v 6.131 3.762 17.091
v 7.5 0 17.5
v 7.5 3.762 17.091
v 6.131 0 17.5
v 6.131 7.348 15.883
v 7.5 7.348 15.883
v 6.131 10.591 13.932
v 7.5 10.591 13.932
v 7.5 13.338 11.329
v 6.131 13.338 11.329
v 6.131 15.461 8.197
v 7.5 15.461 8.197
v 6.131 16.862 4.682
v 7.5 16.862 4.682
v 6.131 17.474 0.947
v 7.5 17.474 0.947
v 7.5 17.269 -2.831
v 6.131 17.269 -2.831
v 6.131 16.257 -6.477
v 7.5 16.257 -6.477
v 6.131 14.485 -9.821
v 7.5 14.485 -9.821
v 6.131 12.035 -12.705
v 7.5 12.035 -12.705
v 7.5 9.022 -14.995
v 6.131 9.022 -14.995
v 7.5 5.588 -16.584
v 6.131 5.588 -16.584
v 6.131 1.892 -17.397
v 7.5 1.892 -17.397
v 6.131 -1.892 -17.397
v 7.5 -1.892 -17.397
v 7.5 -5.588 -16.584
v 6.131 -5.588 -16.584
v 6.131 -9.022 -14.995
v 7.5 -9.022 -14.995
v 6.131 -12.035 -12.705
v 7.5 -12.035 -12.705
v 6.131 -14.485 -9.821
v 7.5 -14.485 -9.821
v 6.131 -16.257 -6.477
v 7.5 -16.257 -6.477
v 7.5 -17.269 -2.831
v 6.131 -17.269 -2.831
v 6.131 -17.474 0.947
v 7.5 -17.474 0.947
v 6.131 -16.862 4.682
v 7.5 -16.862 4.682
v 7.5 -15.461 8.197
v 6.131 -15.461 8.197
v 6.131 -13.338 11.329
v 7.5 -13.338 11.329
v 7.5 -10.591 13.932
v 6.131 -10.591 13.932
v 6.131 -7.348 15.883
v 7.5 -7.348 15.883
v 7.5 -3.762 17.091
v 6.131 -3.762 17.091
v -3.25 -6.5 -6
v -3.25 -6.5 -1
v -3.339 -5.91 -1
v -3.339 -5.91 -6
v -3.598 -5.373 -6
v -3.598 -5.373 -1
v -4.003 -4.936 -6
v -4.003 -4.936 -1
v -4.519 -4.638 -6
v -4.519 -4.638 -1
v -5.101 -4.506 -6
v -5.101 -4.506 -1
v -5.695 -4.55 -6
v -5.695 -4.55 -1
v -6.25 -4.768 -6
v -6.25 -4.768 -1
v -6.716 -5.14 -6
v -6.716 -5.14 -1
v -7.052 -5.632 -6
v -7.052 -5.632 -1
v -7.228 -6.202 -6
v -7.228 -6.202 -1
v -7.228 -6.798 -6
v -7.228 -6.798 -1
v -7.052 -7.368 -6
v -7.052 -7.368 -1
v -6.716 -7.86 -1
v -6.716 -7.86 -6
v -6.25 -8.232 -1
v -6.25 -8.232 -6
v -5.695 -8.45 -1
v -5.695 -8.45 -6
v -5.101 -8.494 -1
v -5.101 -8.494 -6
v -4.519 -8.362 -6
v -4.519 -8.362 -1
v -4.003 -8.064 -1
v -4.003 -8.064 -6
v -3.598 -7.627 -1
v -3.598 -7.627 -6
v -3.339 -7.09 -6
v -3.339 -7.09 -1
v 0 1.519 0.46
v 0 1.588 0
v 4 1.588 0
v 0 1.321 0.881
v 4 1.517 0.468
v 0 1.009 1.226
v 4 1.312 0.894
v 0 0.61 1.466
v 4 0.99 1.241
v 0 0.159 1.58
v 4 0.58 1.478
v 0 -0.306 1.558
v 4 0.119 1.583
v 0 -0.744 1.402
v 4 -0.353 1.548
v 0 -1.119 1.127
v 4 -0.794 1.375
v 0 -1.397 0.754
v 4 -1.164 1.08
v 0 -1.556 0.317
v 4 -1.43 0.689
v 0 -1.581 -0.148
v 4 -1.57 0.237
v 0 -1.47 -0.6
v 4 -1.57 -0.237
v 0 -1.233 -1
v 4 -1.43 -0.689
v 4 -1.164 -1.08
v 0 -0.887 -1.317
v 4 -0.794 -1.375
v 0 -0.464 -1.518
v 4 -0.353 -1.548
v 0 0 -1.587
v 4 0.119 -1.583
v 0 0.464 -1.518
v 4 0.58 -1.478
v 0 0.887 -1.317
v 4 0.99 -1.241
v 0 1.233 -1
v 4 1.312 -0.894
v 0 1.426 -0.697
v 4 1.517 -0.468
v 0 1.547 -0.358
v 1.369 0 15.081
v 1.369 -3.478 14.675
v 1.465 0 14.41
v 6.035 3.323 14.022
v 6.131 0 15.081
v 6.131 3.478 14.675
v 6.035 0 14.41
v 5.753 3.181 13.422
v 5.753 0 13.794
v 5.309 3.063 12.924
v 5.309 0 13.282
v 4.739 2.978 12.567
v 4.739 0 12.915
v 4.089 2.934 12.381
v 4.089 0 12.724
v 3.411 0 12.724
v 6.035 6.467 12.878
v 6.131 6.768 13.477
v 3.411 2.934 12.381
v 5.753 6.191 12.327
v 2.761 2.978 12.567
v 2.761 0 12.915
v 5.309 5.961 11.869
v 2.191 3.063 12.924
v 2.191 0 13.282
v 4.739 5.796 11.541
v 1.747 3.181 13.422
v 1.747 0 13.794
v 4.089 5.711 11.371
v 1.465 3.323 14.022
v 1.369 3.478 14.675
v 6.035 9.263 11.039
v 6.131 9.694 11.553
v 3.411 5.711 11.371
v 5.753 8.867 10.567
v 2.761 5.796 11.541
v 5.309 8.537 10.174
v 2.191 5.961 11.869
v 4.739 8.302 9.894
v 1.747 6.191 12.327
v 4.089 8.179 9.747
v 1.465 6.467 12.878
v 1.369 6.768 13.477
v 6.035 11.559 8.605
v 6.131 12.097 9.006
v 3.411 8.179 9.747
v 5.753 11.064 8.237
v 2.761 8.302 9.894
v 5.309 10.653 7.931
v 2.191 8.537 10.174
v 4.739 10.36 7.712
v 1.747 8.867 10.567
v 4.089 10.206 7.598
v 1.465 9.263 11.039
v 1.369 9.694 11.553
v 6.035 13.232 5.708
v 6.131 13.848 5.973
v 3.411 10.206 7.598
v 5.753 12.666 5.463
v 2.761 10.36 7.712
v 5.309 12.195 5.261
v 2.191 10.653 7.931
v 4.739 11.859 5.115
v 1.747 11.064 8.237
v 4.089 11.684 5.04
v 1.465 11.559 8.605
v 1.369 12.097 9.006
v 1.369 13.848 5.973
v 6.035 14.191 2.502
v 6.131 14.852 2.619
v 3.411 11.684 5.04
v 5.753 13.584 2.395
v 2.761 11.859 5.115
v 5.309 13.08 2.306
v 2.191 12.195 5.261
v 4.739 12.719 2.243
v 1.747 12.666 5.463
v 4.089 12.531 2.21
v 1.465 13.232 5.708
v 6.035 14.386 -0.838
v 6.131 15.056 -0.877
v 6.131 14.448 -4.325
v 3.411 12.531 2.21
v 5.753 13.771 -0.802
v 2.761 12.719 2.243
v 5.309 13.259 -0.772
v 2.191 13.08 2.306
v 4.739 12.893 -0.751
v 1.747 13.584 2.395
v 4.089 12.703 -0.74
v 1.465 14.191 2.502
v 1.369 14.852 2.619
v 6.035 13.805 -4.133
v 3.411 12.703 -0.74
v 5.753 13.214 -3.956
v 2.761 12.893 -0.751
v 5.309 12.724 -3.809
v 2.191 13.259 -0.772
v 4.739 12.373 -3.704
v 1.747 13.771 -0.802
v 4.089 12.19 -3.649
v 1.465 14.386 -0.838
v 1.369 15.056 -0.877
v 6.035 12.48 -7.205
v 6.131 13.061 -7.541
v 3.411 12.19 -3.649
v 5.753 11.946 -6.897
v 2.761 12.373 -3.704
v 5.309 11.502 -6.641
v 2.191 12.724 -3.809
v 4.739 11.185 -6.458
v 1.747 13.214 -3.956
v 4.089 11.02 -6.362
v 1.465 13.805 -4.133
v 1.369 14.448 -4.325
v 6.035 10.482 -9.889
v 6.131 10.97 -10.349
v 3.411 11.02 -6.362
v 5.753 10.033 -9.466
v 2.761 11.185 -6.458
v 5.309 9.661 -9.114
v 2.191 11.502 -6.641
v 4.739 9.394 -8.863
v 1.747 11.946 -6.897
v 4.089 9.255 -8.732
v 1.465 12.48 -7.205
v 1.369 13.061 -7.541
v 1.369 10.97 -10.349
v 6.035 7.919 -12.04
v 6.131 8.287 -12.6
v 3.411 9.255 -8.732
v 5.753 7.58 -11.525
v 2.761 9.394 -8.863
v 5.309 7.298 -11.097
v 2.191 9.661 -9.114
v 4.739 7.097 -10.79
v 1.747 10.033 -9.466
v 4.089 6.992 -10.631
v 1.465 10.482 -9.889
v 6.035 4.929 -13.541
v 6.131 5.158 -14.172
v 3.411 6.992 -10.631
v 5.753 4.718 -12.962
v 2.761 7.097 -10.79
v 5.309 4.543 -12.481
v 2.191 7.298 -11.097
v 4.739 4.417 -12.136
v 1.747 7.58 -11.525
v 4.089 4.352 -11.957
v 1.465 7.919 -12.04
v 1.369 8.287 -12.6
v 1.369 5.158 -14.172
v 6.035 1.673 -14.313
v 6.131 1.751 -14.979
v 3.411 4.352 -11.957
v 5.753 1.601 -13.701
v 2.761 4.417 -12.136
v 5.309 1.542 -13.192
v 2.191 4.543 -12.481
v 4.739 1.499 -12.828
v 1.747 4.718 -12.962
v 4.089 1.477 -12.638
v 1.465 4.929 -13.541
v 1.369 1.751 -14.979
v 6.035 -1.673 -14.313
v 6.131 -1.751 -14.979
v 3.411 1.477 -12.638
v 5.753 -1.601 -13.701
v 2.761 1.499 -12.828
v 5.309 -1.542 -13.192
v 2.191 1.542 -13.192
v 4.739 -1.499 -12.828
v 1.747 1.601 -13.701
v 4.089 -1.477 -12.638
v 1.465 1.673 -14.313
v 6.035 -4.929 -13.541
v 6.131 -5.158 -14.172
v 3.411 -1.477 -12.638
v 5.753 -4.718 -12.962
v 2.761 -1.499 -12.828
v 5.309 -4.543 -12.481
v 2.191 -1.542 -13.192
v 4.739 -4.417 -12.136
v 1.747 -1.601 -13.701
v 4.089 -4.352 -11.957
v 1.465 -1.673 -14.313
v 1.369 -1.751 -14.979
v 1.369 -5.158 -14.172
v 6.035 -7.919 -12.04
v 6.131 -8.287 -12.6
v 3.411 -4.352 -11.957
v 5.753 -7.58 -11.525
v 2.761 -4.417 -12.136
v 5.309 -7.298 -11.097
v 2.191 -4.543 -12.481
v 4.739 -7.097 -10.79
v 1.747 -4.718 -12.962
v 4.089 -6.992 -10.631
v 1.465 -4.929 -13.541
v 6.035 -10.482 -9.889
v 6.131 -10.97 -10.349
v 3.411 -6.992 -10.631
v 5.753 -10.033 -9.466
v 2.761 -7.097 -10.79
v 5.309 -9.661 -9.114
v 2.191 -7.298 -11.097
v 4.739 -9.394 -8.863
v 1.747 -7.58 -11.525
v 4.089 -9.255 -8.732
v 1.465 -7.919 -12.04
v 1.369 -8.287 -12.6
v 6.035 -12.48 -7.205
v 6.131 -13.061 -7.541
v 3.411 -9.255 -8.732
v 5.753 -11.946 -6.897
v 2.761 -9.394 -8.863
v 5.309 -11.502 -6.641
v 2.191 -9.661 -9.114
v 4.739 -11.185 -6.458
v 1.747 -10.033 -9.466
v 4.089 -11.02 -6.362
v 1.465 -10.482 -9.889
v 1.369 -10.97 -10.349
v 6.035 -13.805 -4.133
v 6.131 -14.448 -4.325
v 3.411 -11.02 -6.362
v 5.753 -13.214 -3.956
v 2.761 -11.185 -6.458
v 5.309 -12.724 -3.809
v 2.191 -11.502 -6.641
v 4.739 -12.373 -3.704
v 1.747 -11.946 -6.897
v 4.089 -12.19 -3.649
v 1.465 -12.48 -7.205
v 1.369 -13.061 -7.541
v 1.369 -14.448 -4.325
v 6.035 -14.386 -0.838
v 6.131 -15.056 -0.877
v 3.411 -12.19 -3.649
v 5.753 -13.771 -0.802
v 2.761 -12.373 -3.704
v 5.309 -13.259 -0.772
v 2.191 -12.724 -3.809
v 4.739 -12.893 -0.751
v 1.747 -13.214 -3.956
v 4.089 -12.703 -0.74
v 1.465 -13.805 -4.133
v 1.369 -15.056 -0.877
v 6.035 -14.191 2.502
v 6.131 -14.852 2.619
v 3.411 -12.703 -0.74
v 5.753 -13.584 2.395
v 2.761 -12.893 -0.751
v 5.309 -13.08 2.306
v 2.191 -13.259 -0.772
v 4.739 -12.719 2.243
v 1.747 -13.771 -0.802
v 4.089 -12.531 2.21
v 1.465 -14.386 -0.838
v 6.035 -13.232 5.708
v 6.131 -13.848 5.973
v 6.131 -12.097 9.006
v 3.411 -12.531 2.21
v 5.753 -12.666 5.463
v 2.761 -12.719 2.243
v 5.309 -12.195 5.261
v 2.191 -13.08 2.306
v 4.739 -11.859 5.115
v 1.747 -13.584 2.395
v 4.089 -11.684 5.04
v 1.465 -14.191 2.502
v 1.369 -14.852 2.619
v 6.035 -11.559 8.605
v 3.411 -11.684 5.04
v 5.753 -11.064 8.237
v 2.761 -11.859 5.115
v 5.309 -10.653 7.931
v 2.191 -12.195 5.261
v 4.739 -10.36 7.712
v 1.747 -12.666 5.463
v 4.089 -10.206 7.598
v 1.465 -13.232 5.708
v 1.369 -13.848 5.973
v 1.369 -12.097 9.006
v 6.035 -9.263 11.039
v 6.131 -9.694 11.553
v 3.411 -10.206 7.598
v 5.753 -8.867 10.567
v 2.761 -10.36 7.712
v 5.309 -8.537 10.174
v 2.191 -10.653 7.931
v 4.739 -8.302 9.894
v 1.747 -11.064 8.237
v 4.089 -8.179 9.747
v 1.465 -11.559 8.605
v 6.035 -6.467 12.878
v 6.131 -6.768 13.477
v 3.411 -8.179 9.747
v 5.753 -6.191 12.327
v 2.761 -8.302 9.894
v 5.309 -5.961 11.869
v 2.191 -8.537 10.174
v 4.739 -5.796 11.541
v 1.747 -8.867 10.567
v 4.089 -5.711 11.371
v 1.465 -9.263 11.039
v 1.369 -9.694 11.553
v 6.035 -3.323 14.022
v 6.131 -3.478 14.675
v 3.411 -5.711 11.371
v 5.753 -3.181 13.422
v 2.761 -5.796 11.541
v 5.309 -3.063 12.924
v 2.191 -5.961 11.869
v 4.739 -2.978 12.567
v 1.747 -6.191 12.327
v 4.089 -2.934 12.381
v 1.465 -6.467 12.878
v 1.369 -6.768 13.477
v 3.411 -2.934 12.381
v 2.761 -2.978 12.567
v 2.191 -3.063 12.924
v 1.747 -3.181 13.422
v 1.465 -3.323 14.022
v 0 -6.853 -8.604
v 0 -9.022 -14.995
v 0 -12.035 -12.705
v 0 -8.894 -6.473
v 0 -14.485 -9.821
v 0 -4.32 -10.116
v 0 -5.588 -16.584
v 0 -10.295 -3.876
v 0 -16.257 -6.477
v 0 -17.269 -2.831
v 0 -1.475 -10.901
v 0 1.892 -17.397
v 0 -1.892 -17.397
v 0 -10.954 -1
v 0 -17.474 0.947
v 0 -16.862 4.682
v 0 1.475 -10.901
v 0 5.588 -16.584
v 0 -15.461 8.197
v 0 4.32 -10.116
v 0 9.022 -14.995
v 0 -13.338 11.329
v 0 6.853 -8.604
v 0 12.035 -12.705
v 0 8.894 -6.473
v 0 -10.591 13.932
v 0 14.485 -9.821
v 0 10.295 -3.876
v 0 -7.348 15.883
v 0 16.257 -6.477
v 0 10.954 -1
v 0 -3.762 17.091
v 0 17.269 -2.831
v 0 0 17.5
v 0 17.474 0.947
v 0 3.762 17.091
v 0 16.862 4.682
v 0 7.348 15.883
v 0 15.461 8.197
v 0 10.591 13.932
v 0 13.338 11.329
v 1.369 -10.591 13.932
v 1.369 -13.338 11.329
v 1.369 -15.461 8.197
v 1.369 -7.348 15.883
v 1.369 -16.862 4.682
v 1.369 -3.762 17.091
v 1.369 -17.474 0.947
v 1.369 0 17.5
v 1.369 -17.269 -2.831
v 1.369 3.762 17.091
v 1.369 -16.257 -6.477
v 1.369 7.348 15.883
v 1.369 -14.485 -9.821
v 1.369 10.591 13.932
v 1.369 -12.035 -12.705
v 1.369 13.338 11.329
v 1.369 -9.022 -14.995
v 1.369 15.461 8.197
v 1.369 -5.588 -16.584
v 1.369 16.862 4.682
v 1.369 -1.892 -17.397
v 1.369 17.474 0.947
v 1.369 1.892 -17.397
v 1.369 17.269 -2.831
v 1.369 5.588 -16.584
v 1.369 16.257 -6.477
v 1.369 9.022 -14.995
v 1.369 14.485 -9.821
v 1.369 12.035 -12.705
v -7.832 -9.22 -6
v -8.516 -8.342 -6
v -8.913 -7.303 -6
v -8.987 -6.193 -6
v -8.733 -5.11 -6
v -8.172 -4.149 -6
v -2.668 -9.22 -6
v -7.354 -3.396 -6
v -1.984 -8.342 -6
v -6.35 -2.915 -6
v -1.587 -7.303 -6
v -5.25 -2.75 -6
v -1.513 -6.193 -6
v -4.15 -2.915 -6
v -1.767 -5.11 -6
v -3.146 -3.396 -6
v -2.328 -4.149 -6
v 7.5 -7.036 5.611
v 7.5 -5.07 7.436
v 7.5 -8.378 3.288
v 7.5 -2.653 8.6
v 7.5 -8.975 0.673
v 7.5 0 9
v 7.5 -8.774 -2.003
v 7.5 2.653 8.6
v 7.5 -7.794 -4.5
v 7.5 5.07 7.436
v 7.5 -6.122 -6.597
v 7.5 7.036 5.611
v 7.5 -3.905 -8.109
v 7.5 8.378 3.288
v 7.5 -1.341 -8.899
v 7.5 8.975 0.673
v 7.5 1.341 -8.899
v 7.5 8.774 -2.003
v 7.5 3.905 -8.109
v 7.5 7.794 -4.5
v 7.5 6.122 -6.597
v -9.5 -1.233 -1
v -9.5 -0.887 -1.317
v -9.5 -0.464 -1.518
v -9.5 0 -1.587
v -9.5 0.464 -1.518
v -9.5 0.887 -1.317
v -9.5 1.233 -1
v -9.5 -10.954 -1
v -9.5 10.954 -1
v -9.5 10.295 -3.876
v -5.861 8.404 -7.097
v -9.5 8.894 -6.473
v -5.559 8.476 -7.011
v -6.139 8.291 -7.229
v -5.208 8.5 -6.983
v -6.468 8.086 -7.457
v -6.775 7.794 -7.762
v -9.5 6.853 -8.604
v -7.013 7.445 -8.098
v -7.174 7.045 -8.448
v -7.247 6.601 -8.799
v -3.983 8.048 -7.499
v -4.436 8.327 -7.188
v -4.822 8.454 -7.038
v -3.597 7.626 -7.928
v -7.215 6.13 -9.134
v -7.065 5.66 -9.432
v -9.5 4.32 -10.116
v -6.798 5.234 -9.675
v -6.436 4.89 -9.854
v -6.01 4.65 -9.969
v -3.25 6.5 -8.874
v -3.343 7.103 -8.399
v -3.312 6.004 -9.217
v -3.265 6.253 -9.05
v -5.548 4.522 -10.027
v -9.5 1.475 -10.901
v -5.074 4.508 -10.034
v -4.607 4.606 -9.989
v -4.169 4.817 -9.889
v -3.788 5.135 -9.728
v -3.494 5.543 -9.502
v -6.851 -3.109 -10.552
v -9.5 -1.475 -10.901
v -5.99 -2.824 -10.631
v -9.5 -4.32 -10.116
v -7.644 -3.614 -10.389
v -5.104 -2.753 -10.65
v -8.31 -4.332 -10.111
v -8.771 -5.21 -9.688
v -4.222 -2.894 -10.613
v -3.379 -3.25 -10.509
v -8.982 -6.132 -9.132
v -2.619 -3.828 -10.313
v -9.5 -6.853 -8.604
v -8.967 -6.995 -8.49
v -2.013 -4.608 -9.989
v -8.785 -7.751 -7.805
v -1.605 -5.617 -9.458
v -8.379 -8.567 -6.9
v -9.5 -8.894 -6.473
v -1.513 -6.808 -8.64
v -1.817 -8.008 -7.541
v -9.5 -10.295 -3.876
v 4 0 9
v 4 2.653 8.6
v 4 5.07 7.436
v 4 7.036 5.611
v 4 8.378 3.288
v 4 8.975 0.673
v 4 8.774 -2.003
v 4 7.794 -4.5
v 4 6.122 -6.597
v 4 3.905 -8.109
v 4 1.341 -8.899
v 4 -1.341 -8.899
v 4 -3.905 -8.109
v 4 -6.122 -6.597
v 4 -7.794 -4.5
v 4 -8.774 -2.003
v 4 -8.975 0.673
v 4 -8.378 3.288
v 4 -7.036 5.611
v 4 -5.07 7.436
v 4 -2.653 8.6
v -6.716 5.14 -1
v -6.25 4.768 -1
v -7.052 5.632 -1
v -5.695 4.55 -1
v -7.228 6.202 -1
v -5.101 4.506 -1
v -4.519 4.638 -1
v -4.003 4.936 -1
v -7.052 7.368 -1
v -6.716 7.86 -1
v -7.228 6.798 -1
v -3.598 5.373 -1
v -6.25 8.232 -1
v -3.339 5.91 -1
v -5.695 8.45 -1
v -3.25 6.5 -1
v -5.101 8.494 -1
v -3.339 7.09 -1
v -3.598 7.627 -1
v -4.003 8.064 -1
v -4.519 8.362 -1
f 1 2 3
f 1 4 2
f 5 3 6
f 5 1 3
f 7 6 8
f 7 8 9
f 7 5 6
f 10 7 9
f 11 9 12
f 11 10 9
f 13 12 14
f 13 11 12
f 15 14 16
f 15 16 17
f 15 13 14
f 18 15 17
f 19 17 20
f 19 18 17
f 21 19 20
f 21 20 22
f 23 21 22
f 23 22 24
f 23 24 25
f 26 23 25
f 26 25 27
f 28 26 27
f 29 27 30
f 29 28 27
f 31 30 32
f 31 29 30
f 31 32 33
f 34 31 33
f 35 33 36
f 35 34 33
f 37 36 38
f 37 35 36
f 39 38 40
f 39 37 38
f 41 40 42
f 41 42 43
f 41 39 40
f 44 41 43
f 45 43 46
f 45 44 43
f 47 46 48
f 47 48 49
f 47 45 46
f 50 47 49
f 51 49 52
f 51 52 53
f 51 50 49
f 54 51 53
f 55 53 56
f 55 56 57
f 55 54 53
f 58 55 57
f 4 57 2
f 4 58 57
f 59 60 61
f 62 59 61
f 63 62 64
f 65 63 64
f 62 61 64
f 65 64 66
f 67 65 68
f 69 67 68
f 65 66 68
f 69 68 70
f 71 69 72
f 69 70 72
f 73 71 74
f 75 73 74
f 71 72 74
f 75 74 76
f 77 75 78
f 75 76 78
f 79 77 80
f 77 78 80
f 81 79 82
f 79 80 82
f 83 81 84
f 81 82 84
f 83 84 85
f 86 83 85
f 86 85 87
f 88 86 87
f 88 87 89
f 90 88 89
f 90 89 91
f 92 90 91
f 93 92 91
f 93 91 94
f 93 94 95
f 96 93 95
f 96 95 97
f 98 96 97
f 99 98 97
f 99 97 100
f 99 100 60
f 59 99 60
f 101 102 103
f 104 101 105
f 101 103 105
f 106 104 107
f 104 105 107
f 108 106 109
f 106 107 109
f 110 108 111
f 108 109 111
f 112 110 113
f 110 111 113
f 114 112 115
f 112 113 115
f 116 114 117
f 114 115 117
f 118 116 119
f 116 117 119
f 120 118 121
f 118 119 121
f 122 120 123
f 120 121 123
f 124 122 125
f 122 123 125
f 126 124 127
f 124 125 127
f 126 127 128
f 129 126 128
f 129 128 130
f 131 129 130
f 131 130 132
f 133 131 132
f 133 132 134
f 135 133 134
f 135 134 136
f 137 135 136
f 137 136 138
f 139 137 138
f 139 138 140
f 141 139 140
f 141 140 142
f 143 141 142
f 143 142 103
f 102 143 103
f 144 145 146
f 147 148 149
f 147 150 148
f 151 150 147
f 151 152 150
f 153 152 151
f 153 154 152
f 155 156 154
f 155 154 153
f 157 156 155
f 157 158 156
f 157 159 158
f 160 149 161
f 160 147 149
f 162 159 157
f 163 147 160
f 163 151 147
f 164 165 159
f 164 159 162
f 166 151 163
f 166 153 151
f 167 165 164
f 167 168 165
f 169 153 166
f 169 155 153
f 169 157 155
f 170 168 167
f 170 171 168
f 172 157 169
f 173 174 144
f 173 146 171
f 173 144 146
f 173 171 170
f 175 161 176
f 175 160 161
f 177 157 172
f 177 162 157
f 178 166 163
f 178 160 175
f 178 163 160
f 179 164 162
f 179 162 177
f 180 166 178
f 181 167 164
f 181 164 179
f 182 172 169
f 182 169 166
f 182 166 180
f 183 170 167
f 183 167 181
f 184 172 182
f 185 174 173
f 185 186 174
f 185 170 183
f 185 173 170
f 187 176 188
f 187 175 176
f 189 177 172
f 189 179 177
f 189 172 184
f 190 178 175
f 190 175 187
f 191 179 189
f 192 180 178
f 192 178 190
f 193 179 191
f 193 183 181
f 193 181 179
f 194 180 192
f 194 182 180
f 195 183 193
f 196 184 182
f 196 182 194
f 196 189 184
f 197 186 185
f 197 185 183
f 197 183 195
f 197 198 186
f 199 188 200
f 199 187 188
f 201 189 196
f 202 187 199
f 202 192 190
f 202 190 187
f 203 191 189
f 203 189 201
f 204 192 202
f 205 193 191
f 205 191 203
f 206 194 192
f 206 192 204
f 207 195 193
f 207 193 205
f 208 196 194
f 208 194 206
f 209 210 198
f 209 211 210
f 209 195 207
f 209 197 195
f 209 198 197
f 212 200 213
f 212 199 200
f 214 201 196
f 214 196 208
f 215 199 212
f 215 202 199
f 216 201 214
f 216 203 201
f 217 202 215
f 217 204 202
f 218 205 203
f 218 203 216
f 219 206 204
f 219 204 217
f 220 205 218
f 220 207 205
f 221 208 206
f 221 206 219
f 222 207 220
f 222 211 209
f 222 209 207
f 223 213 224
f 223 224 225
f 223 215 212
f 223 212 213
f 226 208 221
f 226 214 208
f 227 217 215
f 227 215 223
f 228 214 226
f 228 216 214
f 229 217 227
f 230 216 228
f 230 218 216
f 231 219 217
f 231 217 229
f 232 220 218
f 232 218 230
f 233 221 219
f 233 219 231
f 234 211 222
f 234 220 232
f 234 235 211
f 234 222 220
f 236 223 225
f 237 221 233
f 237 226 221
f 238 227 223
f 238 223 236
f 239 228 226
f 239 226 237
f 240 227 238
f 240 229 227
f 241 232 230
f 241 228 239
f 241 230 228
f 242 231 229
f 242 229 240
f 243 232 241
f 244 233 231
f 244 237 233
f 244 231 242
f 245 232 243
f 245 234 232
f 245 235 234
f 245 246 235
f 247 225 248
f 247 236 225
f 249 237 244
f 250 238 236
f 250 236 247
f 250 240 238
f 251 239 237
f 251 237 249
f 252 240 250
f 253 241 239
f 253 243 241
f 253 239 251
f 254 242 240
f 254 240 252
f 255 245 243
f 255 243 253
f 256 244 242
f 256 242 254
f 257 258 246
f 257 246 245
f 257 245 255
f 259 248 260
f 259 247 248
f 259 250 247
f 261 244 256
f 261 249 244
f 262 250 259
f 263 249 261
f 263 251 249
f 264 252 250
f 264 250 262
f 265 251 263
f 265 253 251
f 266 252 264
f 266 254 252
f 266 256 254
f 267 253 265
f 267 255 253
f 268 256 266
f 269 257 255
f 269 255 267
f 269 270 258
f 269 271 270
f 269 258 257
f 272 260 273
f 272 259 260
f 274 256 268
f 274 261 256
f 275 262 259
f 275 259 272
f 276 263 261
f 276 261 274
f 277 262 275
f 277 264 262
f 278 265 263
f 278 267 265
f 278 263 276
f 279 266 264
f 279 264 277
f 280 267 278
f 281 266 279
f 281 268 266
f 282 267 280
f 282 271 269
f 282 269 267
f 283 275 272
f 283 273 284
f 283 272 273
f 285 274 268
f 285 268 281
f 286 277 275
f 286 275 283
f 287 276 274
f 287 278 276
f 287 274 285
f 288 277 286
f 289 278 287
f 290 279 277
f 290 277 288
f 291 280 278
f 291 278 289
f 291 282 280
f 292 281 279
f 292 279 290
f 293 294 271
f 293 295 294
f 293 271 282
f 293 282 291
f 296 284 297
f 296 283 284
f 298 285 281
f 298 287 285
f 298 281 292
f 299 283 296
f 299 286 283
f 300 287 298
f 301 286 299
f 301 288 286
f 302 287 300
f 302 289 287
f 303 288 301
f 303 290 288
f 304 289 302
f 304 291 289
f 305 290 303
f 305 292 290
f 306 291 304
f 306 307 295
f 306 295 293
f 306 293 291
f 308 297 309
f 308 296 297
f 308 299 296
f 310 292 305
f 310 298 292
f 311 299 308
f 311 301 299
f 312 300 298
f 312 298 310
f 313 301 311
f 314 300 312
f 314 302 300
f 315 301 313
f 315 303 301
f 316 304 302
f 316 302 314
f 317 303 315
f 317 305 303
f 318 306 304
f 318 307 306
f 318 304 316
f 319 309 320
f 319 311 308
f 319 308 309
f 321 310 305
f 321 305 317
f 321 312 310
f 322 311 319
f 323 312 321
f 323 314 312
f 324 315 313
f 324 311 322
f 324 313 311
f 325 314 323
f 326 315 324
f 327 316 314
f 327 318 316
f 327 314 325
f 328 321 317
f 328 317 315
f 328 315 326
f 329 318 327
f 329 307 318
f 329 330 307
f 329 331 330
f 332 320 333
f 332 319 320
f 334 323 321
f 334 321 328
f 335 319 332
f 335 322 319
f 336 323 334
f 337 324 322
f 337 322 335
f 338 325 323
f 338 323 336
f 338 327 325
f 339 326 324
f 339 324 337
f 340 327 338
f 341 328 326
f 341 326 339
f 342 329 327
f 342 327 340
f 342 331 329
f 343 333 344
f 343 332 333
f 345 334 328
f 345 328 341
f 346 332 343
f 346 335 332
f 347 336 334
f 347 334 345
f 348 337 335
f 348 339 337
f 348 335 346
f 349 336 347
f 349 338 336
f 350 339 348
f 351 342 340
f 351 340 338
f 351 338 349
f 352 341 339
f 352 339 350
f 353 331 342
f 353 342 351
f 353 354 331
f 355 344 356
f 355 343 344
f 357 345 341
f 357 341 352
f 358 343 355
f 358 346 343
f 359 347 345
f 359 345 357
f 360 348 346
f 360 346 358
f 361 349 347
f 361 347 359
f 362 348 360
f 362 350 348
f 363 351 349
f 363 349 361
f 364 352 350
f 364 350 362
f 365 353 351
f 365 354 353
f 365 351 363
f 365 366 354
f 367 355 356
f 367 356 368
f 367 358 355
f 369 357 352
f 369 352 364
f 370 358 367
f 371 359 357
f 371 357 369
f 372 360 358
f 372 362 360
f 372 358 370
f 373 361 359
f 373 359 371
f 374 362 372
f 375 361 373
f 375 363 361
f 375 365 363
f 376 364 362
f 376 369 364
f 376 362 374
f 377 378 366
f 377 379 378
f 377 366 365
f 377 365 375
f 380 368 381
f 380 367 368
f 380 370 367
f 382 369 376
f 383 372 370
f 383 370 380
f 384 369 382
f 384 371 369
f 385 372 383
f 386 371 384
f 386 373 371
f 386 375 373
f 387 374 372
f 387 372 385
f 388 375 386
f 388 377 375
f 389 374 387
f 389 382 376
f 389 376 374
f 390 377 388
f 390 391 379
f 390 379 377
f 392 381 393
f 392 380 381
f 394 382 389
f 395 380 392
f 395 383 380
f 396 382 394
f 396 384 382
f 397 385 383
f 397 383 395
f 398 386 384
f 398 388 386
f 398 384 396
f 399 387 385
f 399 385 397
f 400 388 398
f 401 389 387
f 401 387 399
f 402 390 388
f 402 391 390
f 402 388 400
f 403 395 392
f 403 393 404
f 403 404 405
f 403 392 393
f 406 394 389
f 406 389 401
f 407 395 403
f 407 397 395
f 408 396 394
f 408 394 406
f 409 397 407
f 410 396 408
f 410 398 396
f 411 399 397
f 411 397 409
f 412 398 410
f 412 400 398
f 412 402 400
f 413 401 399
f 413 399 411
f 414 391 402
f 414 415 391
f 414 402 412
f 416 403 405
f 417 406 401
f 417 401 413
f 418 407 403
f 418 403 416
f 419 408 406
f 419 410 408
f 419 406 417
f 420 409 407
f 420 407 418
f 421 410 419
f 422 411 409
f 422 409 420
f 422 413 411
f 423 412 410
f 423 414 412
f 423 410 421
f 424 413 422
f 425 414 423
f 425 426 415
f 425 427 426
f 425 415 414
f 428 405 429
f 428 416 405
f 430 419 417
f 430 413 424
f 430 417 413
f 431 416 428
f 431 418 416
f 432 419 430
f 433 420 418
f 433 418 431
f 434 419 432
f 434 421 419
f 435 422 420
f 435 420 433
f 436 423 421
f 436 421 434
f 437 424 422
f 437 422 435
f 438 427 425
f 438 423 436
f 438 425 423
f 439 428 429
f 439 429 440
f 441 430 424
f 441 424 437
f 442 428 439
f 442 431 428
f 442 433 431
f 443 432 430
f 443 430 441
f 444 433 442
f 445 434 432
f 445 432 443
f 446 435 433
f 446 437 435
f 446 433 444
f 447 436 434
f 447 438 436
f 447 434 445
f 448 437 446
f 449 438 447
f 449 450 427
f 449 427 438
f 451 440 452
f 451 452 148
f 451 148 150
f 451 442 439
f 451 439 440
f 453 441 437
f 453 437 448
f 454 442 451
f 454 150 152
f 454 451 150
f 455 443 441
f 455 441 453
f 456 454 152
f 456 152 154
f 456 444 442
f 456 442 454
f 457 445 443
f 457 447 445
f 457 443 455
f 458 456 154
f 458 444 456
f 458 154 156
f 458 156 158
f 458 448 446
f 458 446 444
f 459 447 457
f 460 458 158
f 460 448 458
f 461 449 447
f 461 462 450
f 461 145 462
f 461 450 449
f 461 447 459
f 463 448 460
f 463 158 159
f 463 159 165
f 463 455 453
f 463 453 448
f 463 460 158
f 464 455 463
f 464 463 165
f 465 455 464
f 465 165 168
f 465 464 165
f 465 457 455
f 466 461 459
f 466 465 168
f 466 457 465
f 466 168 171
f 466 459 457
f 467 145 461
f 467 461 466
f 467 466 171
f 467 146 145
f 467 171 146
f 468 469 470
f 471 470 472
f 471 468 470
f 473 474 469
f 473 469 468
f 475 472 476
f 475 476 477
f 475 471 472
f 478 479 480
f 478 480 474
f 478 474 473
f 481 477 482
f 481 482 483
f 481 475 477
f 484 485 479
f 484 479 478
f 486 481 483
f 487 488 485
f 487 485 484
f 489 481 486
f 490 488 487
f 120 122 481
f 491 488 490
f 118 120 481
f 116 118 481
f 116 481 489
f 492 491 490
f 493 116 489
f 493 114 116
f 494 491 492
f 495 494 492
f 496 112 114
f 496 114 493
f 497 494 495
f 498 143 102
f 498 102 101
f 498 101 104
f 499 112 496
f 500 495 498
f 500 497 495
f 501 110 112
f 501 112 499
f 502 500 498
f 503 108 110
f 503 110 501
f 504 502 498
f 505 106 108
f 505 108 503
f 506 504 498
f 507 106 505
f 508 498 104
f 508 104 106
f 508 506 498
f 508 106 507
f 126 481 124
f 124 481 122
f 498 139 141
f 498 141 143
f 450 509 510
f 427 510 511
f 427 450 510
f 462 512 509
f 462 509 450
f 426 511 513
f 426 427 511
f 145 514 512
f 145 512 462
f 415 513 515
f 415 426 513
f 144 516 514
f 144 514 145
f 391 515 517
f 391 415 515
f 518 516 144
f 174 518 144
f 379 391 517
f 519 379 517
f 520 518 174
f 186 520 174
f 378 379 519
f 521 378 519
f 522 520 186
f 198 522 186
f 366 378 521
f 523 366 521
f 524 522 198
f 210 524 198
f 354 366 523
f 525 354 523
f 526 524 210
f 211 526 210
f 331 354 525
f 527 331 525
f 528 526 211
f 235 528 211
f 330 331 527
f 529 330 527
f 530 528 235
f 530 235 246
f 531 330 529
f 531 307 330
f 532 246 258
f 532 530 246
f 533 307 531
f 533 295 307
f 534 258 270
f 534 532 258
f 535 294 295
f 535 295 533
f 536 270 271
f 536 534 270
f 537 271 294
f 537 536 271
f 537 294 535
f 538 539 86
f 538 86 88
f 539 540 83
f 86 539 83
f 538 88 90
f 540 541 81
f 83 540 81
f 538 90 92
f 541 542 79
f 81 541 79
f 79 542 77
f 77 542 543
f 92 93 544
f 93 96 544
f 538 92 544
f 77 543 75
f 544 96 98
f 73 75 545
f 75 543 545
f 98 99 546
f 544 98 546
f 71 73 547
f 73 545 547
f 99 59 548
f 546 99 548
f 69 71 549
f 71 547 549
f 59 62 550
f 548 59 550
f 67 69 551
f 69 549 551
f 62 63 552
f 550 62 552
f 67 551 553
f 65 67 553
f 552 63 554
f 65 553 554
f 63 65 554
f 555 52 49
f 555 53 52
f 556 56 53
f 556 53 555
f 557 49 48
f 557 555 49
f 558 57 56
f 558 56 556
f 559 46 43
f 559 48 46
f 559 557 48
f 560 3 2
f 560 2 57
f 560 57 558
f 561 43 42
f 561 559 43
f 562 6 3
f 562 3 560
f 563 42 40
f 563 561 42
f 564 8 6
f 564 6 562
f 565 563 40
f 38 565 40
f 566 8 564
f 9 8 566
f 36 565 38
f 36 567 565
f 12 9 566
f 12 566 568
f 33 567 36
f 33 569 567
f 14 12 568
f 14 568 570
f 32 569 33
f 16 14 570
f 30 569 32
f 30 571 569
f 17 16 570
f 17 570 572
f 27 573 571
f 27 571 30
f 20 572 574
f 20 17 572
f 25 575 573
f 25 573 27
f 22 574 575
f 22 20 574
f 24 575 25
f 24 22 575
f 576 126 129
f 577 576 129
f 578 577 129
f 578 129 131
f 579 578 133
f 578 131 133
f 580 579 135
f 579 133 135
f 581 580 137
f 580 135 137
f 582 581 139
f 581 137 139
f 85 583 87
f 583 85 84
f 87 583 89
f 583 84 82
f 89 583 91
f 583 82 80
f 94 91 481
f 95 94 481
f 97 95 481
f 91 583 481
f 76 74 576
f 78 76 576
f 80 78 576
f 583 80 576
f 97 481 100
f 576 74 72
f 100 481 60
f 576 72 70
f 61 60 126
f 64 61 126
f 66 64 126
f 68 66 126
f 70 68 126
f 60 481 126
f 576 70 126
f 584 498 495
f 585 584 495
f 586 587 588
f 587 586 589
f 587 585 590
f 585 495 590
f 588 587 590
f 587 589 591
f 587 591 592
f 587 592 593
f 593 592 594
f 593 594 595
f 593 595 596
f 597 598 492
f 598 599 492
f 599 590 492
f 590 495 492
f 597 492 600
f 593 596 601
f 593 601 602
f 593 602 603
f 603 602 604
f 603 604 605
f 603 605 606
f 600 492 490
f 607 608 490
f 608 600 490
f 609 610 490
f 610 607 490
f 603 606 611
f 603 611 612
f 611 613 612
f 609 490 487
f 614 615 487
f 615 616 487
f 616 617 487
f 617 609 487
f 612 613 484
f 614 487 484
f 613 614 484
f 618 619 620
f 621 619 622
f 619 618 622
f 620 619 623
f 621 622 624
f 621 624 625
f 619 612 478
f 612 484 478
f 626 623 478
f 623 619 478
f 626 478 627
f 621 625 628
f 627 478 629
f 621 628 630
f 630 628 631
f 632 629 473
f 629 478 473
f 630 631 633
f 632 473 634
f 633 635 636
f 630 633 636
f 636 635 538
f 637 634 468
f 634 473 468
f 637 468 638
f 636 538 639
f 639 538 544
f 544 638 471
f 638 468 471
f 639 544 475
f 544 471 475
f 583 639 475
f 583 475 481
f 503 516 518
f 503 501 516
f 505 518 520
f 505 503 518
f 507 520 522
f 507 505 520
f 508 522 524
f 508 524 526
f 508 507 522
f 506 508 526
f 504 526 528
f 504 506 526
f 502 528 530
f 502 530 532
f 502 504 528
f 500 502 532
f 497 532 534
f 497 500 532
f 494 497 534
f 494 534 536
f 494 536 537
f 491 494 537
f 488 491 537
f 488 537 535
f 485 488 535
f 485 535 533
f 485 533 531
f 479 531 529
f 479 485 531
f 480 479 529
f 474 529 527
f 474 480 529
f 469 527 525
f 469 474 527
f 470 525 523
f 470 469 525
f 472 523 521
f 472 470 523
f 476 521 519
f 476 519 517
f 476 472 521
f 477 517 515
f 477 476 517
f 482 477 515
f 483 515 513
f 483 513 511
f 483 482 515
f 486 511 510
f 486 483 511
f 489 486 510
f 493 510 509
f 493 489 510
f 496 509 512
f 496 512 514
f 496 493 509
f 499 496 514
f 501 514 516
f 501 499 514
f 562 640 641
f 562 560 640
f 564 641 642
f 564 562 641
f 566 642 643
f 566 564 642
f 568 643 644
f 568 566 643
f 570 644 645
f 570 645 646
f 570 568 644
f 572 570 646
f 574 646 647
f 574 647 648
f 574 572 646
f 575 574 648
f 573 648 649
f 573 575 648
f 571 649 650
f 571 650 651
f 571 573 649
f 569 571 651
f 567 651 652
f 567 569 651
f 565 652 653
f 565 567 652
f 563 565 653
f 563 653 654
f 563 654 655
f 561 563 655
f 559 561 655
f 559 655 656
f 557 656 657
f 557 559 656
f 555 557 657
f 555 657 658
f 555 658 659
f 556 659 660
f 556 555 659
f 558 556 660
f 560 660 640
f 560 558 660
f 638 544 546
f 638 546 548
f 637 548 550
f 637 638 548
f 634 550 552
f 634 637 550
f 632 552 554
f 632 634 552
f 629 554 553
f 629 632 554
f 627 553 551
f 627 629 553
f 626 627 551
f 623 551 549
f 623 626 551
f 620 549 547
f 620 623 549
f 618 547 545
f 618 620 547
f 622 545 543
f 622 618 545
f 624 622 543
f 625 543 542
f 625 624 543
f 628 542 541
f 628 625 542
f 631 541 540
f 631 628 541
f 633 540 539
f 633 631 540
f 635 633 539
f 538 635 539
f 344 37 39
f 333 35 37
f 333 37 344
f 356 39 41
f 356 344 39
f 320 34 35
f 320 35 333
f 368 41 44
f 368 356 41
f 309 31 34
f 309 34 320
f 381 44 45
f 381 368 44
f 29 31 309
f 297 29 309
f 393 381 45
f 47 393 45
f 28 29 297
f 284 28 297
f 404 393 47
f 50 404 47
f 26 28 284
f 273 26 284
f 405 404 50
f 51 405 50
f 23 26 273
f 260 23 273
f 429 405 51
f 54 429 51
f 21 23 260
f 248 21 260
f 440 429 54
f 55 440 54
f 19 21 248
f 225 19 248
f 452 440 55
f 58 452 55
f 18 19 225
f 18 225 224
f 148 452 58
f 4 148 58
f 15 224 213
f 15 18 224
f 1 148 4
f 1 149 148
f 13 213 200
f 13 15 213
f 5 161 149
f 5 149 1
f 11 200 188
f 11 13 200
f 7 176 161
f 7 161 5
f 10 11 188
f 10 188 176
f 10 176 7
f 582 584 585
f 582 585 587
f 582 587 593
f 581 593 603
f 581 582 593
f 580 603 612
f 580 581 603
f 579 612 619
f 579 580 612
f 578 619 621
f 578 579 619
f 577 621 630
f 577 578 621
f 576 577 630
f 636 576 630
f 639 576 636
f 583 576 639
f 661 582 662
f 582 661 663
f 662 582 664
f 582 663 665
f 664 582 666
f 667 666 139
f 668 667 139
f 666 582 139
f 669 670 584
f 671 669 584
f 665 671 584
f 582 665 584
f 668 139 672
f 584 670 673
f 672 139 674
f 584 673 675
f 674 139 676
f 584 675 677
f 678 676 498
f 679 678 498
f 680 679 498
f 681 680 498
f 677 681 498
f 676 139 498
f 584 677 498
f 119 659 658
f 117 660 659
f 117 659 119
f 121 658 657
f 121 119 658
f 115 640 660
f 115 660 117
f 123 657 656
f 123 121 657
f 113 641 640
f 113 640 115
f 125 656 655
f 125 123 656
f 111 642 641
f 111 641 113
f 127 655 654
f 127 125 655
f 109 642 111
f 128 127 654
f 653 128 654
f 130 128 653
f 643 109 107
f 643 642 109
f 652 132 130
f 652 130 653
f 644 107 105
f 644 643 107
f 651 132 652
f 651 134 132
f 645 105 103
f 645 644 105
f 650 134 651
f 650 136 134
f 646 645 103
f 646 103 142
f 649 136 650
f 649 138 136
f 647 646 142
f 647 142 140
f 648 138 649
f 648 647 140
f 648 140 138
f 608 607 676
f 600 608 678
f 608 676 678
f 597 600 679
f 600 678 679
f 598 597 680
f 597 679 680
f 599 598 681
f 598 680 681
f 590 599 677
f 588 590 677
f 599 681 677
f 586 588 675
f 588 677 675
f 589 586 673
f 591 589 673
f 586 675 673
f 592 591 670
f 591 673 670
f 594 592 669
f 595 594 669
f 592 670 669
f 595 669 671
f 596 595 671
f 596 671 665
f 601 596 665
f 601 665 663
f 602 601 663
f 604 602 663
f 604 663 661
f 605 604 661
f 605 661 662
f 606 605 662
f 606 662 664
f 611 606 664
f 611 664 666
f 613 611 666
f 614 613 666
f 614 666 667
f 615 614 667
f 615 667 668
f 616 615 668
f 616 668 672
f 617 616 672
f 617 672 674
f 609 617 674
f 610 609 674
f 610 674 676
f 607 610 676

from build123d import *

# Parameters (mm, degrees)
F2_R      = 1.5875
F3_DEPTH  = 7.501
F5_DEPTH  = 9.5
F6_R      = 2
F7_DEPTH  = 16.501
F9_R      = 3.75
F10_DEPTH = 5


with BuildPart() as f1:
    # F0 (on Front) → F1 (revolve)
    with BuildSketch(Plane.XZ):
        with BuildLine():
            Line((0, 17.5), (0, 0))
            Line((0, 0), (4, 0))
            Line((4, 0), (4, 9))
            Line((4, 9), (7.5, 9))
            Line((7.5, 9), (7.5, 17.5))
            Line((7.5, 17.5), (6.13125, 17.5))
            Line((6.13125, 17.5), (6.13125, 15.08125))
            ThreePointArc((6.13125, 15.08125), (3.75, 12.7), (1.36875, 15.08125))
            Line((1.36875, 15.08125), (1.36875, 17.5))
            Line((1.36875, 17.5), (0, 17.5))
        make_face()
    revolve(axis=Axis((2, 0, 0), (-1, 0, 0)))

    # F2 (on face) → F3 (cut, through all)
    with BuildSketch(Plane.YZ.offset(7.5)):
        Circle(F2_R)
    extrude(amount=-F3_DEPTH, mode=Mode.SUBTRACT)

    # F4 (on face) → F5 (join)
    with BuildSketch(Plane(origin=(0, 0, 0), x_dir=(0, -1, 0), z_dir=(-1, 0, 0))):
        with BuildLine():
            Line((-1.2329461667, -1), (-10.9544511501, -1))
            ThreePointArc((-10.9544511501, -1), (0, -11), (10.9544511501, -1))
            Line((10.9544511501, -1), (1.2329461667, -1))
            ThreePointArc((1.2329461667, -1), (0, -1.5875), (-1.2329461667, -1))
        make_face()
    extrude(amount=F5_DEPTH)

    # F6 (on face) → F7 (cut, through all)
    with BuildSketch(Plane.XY.offset(-1)):
        with Locations((-5.25, 6.5)):
            Circle(F6_R)
        with Locations((-5.25, -6.5)):
            Circle(F6_R)
    extrude(amount=-F7_DEPTH, mode=Mode.SUBTRACT)

    # F9 (on offset) → F10 (cut)
    with BuildSketch(Plane.XY.offset(-11)):
        with Locations((-5.25, -6.5)):
            Circle(F9_R)
    extrude(amount=F10_DEPTH, mode=Mode.SUBTRACT)


solid = f1.part
